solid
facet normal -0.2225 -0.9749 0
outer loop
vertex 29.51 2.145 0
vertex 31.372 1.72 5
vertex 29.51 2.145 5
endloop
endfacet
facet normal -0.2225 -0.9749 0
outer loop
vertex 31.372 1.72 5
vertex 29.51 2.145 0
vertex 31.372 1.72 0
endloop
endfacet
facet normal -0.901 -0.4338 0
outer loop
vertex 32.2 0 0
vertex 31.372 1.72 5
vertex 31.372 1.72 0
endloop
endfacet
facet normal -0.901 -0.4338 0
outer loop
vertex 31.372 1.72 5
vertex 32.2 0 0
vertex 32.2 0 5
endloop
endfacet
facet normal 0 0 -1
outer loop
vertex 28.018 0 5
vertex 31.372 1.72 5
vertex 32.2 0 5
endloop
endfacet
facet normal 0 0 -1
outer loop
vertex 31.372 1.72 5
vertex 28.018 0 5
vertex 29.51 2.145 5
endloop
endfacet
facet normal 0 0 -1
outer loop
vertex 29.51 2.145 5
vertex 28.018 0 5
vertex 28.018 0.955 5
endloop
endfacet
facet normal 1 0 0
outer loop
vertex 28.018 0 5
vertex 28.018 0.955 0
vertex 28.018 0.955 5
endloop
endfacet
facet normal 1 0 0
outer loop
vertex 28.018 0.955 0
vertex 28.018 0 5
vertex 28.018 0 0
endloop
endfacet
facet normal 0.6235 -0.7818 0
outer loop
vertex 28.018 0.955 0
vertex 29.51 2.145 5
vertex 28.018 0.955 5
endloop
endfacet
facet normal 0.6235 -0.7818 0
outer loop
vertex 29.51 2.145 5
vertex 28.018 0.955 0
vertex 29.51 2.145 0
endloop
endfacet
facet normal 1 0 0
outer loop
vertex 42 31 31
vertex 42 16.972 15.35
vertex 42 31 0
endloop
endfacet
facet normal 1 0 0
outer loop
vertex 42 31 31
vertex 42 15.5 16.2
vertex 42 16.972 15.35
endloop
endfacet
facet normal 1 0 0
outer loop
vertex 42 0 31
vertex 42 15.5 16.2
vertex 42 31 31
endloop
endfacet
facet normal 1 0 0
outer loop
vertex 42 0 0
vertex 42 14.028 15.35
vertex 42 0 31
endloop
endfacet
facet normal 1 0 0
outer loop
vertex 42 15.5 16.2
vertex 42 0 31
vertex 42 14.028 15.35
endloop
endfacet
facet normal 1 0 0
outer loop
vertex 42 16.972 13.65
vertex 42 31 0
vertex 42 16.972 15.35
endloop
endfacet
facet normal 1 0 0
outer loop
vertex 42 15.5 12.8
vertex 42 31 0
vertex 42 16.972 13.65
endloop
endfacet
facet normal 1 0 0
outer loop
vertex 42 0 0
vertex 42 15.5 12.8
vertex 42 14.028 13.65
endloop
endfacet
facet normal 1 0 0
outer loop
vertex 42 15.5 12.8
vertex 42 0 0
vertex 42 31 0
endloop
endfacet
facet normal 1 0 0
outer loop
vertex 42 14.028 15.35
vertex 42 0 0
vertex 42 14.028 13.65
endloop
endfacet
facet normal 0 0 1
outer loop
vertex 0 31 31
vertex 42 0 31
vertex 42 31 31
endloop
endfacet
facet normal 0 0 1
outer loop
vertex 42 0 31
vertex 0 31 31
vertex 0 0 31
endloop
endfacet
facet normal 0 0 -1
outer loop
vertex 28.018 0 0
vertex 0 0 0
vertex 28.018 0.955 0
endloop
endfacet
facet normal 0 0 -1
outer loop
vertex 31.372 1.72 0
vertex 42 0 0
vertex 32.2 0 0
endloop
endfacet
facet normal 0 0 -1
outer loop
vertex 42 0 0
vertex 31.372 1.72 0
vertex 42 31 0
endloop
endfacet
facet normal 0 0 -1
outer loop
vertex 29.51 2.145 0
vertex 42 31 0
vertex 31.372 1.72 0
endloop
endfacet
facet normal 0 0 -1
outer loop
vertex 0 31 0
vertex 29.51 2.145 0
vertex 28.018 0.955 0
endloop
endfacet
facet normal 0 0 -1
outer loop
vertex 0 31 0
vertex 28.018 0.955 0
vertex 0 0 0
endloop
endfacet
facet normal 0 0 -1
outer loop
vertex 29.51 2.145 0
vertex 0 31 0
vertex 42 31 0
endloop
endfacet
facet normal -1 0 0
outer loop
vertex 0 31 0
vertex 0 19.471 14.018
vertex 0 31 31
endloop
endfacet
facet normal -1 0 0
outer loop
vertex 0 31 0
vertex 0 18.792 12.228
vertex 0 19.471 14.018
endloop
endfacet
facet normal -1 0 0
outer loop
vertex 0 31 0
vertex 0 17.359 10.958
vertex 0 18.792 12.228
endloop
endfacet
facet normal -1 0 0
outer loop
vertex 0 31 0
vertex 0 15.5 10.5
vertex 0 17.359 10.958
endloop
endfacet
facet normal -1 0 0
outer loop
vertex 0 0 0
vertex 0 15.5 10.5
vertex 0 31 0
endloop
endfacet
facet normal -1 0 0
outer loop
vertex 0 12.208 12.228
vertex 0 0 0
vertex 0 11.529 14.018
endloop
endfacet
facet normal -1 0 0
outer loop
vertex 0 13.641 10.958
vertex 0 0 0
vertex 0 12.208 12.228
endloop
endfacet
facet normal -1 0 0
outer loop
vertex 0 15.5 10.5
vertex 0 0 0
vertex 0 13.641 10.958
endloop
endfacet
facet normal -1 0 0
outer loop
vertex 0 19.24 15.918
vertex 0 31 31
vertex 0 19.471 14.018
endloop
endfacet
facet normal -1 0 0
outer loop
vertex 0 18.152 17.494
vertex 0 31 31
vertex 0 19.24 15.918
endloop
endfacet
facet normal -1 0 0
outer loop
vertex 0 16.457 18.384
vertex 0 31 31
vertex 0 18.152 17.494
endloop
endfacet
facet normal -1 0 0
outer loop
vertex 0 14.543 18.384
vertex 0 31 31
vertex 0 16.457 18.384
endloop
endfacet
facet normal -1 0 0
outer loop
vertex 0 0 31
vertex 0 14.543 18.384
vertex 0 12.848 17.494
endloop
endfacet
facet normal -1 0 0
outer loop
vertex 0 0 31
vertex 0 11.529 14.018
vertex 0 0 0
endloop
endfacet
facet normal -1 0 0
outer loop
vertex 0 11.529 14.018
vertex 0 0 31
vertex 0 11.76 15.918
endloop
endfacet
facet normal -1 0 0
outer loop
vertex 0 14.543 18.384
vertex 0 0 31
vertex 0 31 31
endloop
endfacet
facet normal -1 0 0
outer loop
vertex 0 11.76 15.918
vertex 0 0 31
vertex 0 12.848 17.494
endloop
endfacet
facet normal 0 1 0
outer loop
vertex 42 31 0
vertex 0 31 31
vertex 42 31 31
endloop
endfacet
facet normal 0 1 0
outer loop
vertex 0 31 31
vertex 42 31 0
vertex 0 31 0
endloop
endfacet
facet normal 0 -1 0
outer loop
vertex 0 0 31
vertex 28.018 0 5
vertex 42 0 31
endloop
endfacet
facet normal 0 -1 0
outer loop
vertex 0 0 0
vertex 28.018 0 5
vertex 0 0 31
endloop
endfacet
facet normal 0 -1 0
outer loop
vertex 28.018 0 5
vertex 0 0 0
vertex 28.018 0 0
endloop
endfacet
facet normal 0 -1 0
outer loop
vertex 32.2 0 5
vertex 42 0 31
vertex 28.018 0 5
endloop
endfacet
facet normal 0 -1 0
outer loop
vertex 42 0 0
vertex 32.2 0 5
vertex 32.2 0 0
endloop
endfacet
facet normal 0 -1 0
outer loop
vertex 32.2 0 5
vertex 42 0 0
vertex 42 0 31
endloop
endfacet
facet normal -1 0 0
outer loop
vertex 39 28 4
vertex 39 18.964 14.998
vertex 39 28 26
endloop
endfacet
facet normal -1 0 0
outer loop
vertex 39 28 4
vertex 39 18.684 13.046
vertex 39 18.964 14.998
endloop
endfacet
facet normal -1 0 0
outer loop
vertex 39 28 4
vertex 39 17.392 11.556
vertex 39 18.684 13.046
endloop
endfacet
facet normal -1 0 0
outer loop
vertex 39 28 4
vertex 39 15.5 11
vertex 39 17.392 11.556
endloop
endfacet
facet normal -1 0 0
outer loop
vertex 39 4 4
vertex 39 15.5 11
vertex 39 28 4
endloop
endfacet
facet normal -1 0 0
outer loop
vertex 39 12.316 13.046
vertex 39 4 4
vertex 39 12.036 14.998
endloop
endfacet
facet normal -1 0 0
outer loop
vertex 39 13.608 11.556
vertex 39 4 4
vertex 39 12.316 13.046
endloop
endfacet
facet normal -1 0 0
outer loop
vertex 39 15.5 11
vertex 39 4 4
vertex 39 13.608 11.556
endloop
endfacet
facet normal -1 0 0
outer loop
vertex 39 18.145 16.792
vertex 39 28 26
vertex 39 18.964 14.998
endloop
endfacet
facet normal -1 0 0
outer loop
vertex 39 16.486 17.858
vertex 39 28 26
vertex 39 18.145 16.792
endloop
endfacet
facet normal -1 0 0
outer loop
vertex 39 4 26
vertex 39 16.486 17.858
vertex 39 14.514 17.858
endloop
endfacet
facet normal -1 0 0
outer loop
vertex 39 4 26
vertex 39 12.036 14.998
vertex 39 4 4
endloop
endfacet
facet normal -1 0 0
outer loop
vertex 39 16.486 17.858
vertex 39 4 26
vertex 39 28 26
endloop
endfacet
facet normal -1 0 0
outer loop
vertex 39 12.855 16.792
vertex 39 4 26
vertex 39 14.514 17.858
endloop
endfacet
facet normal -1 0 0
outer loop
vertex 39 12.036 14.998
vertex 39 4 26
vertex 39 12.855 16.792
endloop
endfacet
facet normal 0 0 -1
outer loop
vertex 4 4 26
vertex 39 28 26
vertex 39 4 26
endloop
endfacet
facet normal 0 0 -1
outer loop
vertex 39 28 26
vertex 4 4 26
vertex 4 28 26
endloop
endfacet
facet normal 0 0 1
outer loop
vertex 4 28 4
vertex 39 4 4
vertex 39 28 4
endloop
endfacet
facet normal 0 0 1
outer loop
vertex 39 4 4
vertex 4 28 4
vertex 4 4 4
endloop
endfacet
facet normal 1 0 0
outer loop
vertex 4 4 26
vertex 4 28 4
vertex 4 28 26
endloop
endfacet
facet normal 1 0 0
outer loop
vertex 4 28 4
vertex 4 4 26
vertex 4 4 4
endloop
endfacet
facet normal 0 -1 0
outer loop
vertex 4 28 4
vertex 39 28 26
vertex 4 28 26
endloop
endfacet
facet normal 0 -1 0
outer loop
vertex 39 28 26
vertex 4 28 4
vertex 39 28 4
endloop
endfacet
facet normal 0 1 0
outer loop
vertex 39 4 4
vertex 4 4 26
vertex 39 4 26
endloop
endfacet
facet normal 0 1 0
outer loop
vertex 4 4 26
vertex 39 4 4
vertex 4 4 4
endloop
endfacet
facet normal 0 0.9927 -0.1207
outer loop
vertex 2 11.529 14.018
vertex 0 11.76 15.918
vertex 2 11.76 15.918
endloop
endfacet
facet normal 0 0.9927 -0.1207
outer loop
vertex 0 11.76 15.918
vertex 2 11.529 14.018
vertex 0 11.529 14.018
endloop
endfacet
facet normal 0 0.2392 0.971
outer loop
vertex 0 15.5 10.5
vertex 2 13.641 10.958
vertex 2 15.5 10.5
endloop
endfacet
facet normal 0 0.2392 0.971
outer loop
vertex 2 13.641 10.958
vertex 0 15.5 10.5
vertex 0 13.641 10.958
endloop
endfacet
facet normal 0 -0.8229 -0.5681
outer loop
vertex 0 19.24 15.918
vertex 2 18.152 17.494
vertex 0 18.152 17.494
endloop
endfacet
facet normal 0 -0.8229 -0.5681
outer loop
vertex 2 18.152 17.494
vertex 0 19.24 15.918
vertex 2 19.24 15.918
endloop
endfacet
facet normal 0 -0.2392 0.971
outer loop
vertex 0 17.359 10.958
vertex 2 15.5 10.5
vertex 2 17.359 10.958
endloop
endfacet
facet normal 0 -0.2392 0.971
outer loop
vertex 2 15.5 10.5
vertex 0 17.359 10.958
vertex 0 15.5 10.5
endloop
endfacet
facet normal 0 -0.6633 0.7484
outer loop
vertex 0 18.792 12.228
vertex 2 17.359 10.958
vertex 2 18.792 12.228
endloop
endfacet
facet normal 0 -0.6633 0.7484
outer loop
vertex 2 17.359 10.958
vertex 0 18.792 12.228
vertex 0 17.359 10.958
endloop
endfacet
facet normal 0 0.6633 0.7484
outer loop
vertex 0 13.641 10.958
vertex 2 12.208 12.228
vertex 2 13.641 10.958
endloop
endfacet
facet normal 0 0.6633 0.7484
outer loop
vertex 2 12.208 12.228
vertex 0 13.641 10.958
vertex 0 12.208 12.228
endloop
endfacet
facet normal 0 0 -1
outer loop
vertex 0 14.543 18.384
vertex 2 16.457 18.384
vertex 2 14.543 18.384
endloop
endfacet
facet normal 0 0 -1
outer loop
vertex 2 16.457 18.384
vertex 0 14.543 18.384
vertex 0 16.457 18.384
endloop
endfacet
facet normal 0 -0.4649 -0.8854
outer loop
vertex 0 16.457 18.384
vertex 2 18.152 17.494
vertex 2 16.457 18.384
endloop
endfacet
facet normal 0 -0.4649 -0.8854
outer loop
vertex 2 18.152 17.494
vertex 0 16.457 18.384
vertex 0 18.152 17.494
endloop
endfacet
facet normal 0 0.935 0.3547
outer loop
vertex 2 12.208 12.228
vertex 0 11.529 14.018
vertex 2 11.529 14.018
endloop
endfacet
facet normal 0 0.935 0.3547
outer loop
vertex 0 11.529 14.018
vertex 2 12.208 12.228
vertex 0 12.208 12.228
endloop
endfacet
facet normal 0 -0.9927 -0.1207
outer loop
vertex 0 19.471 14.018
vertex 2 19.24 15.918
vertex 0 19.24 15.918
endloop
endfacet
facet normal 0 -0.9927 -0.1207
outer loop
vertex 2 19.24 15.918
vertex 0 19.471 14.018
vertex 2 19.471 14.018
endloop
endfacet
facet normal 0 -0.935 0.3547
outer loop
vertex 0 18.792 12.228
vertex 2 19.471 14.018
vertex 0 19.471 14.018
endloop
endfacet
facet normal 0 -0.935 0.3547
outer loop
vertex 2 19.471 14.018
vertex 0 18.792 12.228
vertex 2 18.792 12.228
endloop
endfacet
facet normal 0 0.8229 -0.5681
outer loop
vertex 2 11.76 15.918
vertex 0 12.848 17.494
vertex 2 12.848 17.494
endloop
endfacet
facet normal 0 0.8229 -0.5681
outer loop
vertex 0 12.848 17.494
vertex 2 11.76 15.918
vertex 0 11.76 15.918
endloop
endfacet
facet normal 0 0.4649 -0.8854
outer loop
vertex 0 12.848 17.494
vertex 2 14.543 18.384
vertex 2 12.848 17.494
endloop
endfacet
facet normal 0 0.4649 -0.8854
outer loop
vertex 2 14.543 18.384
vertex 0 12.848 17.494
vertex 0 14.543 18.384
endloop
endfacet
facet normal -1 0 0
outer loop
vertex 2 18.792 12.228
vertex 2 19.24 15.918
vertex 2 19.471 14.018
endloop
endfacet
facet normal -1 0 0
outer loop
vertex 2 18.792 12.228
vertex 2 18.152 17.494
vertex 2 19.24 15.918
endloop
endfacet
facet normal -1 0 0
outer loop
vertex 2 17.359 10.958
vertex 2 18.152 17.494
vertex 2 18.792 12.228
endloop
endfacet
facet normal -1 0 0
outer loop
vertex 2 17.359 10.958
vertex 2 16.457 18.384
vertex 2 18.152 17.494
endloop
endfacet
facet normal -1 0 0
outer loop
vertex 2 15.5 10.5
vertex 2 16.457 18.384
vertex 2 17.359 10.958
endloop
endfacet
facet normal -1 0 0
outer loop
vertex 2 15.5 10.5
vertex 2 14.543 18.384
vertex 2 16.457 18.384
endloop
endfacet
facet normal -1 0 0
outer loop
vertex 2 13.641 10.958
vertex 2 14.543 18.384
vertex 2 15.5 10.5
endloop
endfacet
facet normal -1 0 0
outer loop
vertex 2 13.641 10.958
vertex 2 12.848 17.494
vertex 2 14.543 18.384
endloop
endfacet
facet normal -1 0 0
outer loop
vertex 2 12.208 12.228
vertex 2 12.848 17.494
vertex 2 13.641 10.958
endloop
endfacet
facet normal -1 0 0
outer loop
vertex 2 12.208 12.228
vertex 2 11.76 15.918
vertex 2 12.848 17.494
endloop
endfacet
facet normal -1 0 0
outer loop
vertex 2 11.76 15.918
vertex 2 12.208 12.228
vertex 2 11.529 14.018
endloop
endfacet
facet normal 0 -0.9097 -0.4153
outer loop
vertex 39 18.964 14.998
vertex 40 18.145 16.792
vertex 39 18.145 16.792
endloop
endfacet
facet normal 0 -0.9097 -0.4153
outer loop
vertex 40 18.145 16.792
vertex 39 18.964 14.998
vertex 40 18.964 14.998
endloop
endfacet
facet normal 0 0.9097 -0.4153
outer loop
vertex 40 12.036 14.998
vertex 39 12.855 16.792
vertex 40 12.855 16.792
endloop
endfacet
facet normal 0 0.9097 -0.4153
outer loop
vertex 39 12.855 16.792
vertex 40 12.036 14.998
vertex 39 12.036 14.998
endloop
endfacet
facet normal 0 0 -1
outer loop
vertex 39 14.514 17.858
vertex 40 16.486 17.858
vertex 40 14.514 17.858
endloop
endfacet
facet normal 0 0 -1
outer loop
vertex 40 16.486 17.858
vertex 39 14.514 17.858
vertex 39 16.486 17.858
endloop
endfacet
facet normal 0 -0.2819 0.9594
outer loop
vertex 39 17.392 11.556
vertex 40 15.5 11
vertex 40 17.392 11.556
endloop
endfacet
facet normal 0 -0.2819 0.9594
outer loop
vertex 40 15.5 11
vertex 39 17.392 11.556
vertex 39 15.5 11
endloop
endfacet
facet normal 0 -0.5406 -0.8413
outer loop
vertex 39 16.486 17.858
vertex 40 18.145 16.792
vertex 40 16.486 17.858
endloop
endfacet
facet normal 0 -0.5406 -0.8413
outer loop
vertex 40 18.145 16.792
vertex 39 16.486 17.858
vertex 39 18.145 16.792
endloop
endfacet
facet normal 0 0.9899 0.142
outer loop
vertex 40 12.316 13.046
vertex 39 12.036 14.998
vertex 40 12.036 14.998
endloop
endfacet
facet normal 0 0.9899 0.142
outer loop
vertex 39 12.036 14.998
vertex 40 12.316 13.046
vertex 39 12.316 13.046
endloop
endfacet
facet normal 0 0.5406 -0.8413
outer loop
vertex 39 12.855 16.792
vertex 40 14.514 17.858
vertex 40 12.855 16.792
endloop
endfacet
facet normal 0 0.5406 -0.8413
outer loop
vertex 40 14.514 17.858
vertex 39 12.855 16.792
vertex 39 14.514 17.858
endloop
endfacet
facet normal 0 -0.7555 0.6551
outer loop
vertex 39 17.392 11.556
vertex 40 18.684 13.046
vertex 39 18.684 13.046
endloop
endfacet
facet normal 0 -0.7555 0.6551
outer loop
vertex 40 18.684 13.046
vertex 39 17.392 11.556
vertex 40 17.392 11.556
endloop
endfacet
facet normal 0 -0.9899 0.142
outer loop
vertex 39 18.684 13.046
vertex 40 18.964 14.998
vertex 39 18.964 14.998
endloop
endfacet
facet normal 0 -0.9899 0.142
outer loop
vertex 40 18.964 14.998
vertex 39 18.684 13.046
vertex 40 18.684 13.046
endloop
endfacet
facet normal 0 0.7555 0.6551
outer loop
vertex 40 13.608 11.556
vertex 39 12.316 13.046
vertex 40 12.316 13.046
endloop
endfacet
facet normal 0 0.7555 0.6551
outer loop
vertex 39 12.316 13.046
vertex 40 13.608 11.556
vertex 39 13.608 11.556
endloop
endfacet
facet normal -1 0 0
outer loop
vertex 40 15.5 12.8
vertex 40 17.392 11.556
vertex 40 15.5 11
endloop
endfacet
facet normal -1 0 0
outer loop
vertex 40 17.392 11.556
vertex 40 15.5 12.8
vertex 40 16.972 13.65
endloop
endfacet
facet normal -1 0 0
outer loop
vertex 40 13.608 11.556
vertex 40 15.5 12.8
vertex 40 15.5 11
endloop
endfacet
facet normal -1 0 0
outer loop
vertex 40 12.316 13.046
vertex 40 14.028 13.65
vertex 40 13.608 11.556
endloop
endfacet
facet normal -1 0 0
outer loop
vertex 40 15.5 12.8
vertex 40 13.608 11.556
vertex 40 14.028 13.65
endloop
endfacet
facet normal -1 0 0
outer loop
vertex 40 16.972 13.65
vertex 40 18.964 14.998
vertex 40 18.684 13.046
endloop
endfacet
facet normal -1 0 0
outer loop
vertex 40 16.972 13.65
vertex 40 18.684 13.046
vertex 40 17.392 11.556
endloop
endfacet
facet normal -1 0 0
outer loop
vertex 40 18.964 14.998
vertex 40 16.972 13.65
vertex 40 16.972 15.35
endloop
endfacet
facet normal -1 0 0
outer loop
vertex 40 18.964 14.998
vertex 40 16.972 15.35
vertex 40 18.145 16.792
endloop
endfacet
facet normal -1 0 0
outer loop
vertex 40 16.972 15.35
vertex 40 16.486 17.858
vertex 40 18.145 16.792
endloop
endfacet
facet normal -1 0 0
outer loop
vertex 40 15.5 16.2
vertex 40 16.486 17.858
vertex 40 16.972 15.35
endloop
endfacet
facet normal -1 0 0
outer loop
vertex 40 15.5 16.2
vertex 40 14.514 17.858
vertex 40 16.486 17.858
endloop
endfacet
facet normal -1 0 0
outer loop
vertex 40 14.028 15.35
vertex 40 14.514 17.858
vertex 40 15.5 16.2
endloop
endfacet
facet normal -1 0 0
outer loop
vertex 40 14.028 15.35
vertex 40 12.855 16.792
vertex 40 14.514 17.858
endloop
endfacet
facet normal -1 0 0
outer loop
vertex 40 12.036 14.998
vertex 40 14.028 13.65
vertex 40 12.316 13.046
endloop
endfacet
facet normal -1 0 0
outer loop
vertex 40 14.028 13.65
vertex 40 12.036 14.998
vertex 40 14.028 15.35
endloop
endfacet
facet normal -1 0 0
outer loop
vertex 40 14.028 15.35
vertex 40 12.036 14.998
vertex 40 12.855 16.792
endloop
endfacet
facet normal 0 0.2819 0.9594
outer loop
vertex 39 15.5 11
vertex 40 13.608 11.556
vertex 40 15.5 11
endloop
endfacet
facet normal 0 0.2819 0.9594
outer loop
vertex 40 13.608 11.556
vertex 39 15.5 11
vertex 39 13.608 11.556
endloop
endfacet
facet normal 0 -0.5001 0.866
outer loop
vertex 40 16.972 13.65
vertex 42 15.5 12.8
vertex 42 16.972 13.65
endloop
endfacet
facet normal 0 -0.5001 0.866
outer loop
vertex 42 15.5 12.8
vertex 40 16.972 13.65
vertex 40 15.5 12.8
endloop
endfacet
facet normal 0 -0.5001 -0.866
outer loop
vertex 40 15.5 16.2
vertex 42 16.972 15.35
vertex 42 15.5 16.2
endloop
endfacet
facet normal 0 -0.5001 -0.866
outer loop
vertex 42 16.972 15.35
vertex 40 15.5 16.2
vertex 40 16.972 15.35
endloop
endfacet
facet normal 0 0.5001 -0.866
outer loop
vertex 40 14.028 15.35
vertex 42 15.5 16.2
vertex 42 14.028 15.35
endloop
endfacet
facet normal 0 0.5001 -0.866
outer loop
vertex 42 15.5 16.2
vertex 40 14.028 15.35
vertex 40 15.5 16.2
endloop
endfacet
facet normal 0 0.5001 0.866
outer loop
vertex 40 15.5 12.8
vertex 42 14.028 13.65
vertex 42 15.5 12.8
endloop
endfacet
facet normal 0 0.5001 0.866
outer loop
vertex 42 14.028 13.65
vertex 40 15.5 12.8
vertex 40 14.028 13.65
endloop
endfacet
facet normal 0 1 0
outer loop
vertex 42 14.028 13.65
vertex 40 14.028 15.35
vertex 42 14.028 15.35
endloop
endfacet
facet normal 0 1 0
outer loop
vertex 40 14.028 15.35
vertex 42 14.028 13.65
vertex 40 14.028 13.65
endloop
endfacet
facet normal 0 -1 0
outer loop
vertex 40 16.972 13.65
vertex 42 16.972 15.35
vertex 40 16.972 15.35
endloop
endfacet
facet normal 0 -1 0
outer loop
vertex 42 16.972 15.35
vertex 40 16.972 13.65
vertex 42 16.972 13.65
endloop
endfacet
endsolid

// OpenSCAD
// 独立摆锤台架 —— Part 2: U 型舵机夹持座 servo_clamp.scad
// 夹住 HL-2909 机身(34 宽 × 20 高 × 23 深, 输出轴沿 34mm 方向两端伸出)。
// 左侧(花键输出端)开 Ø8 让位槽; 右侧(对侧圆轴)开 Ø7 让位槽;
// 侧面 M3 顶丝压紧机身; 底部 M4×2 锁底座。
// 材质: 铝块(推荐) / PETG 打印(3 层壁 + 40% 填充, 顶丝加 M3 铜螺母)。

servo_w = 34;     // 机身宽(X 向, 轴方向)
servo_h = 20;     // 机身高
servo_d = 23;     // 机身深(Y)

wall    = 4;      // 壁厚
bot_t   = 4;      // 底部板厚
ridge   = 6;      // 上唇压板高
clr     = 1;      // 装配间隙

block_w = servo_w + 2 * wall;         // 44
block_d = servo_d + 2 * wall;         // 31
block_h = bot_t + servo_h + clr + ridge;  // 31

screw_d = 4.4;    // M4 底座孔
clamp_d = 3.4;    // M3 顶丝孔

difference() {
    cube([block_w, block_d, block_h]);
    // 内腔
    translate([wall, wall, bot_t])
        cube([servo_w + clr, servo_d + clr, servo_h + clr + 1]);
    // 左: 花键输出让位槽 Ø8(贯穿上唇前段)
    translate([-1, block_d / 2, bot_t + (servo_h + clr) / 2])
        rotate([0, 90, 0]) cylinder(h = wall + 2, d = 8, center = true);
    // 右: 对侧圆轴让位槽 Ø7
    translate([block_w - wall - 1, block_d / 2, bot_t + (servo_h + clr) / 2])
        rotate([0, 90, 0]) cylinder(h = wall + 2, d = 7, center = true);
    // 顶丝孔(贯穿右壁 → 顶住机身)
    translate([block_w - wall / 2, block_d / 2, bot_t + (servo_h + clr) / 2])
        rotate([0, 90, 0]) cylinder(h = wall + 2, d = clamp_d, center = true);
    // 底座孔 ×2(M4 沉头, 与 base_plate 孔距一致)
    for (sx = [-1, 1])
        translate([sx * 30, 0, -1]) cylinder(h = bot_t + 2, d = screw_d);
}
echo(str("外廓 = ", block_w, " x ", block_d, " x ", block_h, " mm"));
